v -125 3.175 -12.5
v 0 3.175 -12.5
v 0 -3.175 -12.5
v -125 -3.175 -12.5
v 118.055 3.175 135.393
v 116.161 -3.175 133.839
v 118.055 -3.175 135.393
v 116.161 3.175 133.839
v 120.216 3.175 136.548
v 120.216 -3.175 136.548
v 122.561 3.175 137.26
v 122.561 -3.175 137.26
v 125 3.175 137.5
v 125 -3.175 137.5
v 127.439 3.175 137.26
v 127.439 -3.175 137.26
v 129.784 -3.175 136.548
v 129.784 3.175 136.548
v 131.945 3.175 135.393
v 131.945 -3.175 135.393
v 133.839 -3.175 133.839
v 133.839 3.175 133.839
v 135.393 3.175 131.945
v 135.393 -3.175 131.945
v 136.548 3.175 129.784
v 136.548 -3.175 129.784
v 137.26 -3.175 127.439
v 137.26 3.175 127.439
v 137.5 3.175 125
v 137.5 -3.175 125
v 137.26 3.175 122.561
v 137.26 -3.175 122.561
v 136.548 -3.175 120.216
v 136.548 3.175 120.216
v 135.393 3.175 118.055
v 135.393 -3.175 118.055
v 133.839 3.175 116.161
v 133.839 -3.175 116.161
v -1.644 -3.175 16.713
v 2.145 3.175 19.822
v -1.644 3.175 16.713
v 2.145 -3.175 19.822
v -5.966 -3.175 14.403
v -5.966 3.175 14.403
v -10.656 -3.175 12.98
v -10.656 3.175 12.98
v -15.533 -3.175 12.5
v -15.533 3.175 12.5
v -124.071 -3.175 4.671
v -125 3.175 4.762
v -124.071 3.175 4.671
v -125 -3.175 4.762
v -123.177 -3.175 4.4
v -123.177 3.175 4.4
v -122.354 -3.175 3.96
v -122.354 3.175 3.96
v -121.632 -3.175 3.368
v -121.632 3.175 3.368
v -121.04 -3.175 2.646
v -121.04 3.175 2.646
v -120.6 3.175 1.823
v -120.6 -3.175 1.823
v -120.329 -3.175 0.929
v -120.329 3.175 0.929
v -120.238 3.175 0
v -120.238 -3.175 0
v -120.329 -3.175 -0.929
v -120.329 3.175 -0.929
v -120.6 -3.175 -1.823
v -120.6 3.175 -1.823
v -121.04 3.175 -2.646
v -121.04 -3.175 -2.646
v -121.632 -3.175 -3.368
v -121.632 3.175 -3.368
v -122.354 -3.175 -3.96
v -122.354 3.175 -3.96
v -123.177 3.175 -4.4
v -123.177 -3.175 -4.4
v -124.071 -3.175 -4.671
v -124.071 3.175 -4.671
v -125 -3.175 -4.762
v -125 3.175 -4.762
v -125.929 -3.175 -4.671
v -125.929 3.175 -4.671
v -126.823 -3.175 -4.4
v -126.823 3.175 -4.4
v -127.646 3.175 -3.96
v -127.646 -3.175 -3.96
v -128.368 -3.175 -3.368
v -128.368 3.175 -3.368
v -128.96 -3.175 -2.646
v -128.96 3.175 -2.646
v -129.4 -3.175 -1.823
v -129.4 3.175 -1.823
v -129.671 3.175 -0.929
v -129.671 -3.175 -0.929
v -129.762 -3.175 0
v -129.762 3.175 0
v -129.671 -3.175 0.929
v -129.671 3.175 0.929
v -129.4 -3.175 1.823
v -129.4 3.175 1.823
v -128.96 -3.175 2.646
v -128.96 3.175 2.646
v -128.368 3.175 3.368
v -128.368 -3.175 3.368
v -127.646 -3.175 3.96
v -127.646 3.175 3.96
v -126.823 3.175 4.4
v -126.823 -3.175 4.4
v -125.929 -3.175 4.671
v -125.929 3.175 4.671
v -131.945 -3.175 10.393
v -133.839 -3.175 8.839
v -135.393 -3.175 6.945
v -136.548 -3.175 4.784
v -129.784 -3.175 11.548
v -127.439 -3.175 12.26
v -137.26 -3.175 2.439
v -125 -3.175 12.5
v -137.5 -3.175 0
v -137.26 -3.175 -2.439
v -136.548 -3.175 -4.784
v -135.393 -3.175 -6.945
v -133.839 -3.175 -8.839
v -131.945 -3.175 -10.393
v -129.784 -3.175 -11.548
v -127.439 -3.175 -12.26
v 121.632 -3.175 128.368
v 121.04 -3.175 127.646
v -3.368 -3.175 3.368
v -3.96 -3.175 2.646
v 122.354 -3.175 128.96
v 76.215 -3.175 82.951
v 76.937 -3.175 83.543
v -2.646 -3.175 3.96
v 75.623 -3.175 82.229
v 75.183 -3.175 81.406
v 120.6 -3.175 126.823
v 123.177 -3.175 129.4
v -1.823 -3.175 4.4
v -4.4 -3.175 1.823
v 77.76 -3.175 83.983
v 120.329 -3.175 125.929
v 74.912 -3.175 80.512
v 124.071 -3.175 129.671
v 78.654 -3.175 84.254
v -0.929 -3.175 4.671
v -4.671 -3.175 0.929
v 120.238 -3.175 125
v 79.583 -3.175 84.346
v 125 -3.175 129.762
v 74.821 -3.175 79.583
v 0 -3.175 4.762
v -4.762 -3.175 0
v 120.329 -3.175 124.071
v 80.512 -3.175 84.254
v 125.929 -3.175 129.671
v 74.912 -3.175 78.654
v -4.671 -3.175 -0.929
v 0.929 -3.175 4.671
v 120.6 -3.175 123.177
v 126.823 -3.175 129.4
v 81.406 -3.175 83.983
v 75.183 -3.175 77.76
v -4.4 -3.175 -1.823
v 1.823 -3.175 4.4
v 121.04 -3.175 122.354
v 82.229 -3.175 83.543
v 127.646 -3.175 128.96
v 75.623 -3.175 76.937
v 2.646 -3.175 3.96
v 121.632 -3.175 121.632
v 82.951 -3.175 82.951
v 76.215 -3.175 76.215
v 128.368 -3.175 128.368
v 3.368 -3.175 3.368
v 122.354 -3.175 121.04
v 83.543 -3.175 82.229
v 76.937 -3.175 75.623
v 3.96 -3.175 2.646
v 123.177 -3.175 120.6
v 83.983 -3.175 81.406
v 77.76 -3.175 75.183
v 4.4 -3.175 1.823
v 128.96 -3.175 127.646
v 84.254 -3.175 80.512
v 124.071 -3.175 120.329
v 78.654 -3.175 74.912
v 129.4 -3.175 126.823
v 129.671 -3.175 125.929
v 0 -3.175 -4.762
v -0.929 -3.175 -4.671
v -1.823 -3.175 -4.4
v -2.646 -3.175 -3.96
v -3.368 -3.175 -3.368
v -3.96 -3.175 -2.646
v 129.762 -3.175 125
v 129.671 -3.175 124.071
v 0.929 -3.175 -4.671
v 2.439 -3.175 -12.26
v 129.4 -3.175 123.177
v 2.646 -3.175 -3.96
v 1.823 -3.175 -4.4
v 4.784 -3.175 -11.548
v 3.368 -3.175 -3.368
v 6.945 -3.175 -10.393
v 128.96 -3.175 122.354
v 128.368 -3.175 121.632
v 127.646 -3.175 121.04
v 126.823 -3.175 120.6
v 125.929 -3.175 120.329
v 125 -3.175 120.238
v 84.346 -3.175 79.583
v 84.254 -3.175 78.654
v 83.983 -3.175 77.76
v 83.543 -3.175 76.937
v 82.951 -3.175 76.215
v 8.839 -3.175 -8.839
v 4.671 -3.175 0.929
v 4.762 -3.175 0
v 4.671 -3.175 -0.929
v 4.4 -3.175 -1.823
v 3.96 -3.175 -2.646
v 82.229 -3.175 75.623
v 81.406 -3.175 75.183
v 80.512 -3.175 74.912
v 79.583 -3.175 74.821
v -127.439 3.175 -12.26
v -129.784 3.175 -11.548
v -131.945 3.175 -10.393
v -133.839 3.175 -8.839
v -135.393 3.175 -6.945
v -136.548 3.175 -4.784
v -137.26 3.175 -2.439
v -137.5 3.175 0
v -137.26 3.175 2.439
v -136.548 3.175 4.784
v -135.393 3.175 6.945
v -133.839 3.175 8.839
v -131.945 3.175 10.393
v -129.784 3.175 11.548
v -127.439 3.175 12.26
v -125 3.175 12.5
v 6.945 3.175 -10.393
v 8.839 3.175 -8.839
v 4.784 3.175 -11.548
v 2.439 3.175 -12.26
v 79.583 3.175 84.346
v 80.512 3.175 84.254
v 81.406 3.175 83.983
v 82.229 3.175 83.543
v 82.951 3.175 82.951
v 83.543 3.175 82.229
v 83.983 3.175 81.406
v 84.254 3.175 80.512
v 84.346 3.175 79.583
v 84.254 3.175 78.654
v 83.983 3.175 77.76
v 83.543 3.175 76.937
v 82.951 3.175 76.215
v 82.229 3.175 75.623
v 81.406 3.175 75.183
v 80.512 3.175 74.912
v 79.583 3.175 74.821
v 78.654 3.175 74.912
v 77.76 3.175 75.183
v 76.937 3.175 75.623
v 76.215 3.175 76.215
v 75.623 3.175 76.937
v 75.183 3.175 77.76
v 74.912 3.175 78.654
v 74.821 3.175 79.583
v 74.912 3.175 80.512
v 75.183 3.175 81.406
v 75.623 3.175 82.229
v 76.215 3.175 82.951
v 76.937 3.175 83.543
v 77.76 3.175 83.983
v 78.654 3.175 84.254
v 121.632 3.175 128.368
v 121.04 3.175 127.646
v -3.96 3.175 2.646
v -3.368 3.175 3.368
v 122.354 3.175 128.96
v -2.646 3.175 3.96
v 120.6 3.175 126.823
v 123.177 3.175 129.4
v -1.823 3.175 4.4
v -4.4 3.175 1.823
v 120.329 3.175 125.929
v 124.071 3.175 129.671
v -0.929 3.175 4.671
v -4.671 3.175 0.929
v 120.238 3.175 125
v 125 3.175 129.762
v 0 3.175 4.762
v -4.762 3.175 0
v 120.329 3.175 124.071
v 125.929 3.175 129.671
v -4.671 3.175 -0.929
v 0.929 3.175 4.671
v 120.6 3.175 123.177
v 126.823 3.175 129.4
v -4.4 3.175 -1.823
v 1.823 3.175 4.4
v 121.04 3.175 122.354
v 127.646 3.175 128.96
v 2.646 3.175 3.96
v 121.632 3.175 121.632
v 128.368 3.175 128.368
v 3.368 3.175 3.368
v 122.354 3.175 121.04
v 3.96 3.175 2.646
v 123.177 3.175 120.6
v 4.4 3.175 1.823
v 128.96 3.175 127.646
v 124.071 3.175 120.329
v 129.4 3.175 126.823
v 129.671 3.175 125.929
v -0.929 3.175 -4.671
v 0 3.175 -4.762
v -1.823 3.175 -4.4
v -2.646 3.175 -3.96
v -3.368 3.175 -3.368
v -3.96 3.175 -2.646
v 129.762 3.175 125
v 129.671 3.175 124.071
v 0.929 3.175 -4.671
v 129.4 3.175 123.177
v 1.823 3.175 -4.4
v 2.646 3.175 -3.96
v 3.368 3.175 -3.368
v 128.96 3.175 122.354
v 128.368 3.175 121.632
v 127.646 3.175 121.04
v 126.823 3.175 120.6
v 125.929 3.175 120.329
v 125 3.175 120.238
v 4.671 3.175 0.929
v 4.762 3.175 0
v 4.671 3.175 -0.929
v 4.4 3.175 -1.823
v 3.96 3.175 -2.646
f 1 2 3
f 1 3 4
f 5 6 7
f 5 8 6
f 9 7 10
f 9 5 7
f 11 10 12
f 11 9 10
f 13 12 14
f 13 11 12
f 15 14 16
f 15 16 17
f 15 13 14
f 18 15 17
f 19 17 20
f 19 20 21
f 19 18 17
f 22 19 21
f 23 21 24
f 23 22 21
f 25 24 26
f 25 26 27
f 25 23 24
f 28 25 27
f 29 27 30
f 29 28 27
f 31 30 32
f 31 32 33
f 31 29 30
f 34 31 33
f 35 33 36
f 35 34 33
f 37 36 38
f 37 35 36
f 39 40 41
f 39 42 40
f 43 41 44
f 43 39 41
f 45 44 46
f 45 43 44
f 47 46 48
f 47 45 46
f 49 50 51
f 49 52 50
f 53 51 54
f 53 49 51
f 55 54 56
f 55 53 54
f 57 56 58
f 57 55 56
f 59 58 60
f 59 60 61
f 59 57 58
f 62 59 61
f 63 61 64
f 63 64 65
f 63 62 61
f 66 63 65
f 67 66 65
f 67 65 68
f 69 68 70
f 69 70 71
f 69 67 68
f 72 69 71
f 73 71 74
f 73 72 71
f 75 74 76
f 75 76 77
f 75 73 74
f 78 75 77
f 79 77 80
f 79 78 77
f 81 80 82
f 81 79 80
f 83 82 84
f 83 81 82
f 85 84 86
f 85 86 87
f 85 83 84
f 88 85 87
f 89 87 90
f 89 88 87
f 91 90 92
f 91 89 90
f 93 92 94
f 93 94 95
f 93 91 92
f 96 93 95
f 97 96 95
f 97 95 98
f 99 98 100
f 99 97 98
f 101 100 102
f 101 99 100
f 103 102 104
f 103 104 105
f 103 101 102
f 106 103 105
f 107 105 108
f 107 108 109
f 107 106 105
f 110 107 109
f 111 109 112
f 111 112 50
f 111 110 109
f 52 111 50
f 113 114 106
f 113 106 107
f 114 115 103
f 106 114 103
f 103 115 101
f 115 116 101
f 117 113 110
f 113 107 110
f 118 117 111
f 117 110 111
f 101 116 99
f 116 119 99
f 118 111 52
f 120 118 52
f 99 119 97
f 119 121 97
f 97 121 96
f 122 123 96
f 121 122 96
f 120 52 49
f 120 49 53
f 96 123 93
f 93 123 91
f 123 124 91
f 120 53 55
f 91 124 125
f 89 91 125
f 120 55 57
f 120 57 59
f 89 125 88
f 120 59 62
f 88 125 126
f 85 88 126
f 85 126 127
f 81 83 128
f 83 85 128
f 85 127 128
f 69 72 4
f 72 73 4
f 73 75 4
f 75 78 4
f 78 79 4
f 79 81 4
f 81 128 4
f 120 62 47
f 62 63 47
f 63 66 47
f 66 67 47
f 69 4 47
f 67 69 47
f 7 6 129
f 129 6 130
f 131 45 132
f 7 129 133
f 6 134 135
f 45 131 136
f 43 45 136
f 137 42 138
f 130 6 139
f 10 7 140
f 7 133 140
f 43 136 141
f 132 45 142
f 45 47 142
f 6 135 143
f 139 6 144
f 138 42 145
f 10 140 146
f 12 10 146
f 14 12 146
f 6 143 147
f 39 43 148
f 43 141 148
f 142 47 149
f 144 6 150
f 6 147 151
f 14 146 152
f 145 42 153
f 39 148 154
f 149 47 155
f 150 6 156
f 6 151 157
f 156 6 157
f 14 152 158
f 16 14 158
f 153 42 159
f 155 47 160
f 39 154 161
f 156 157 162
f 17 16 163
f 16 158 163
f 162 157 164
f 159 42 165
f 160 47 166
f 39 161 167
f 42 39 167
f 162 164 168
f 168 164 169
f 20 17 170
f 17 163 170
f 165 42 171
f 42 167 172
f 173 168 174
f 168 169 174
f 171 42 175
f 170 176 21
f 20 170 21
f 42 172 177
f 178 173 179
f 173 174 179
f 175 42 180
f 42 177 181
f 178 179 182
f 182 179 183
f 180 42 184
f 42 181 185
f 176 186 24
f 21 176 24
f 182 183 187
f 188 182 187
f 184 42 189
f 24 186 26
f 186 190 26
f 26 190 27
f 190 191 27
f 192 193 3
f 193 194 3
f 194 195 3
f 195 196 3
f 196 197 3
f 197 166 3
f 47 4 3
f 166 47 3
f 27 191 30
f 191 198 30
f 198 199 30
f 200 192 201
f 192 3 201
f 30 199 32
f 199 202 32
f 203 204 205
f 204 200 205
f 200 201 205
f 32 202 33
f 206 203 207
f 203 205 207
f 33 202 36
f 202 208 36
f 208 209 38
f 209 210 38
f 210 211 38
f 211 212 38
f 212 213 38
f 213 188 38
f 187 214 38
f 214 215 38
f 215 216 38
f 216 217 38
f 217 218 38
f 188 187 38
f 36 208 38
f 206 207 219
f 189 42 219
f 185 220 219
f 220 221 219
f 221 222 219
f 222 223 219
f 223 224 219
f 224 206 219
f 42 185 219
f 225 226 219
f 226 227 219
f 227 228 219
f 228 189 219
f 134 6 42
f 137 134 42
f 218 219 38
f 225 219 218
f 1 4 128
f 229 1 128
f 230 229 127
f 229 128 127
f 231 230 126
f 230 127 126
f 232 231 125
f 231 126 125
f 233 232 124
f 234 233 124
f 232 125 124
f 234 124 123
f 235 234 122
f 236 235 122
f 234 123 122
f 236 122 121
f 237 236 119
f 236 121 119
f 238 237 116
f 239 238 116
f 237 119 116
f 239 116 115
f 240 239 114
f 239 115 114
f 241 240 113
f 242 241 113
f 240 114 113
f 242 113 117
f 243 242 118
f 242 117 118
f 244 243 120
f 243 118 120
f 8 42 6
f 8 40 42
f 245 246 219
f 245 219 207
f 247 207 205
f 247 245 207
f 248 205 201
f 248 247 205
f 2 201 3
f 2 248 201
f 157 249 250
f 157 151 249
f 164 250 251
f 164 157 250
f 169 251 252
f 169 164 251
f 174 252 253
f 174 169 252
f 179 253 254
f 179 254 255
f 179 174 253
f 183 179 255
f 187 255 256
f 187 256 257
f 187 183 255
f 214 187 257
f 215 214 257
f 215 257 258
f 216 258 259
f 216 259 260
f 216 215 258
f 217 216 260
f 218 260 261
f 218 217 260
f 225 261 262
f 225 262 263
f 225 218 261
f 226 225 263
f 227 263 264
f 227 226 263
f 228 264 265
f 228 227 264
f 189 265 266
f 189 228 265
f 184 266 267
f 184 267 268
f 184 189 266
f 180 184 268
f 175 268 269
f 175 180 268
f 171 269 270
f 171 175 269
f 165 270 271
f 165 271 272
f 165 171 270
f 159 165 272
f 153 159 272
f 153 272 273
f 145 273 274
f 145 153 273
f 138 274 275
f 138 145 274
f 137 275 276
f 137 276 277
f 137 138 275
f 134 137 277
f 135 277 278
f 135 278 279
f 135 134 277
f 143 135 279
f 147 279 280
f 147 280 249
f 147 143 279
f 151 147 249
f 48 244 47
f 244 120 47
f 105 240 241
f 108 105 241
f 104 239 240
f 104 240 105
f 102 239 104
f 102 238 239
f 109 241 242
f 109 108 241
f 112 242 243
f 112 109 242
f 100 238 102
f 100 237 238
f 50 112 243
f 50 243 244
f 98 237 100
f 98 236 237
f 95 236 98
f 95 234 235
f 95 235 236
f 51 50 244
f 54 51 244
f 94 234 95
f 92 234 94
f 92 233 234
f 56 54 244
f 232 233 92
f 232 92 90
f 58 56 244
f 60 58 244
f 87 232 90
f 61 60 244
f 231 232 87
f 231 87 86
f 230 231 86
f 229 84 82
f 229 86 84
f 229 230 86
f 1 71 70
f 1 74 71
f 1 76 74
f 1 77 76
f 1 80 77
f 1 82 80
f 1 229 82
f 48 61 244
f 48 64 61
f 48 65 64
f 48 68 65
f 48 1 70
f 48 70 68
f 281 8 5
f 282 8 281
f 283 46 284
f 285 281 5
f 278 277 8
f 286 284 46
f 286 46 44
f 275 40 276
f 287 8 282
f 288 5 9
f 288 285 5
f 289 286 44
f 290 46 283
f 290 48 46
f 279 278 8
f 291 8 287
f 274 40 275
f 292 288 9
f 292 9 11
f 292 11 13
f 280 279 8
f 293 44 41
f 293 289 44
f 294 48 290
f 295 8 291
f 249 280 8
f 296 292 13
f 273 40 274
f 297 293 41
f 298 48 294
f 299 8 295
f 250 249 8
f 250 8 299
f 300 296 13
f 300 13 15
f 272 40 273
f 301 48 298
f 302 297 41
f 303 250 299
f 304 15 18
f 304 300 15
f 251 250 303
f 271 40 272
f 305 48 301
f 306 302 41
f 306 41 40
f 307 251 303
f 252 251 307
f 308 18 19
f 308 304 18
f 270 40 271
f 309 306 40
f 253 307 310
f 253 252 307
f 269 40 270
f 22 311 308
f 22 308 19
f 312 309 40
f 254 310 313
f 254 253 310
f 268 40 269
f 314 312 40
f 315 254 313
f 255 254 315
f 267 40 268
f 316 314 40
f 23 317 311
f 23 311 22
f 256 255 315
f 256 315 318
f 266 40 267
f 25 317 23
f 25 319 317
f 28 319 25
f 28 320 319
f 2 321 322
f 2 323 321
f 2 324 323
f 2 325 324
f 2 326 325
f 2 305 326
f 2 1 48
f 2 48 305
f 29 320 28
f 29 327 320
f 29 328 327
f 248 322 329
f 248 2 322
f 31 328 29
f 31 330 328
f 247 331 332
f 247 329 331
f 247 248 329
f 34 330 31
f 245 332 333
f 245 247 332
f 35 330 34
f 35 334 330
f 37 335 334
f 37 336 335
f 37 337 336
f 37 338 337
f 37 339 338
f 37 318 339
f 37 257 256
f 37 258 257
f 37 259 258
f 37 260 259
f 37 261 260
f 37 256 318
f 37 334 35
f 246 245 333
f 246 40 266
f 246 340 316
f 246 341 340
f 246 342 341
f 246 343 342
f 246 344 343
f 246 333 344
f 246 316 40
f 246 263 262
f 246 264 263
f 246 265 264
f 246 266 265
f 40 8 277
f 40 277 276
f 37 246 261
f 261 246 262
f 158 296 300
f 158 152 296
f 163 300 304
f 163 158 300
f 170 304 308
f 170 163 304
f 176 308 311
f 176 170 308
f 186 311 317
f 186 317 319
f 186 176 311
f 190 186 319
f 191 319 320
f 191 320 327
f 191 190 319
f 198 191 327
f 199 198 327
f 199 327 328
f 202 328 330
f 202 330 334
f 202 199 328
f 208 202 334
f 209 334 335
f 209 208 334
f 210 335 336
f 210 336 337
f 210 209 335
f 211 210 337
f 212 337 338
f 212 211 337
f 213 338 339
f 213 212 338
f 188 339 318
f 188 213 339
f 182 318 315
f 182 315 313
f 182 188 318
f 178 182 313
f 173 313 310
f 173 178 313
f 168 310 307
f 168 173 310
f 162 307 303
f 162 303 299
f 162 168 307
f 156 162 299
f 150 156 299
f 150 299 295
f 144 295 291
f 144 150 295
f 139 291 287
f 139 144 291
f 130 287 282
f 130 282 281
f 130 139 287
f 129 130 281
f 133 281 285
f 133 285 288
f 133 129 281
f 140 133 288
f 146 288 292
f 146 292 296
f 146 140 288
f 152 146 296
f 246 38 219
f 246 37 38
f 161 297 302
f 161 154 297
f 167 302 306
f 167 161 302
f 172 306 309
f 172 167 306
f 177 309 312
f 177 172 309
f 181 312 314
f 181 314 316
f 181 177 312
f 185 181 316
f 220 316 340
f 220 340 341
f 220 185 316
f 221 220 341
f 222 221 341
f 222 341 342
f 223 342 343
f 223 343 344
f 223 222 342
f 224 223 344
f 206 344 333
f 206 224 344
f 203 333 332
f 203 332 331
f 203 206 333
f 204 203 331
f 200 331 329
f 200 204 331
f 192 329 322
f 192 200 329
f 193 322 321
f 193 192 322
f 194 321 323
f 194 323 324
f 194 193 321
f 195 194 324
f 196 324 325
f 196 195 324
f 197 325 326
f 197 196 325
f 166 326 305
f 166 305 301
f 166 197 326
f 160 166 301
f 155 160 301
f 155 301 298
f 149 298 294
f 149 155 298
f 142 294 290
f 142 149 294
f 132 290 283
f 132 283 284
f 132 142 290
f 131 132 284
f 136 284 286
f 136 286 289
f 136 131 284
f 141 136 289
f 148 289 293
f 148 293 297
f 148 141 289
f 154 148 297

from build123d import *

# Parameters (mm, degrees)
SKETCH1_R           = 4.7625
BOSS_EXTRUDE1_DEPTH = 3.175
FILLET1_R           = 25


with BuildPart() as part:
    # Sketch1 → Boss-Extrude1 (new, symmetric)
    # profile 1 of 3: a face of its own
    with BuildSketch(Plane(origin=(0, 0, 0), x_dir=(1, 0, 0), z_dir=(0, 1, 0))):
        with BuildLine():
            Line((-125, -12.5), (-5.17766953, -12.5))
            Line((-5.17766953, -12.5), (-8.838834765, -8.838834765))
            ThreePointArc((-8.838834765, -8.838834765), (-11.548494156, 4.783542905), (0, 12.5))
            Line((0, 12.5), (-125, 12.5))
            ThreePointArc((-125, 12.5), (-137.5, 0), (-125, -12.5))
        make_face()
        with Locations(Location((-125, 0, 0), (0, 0, 270))):
            Circle(SKETCH1_R, mode=Mode.SUBTRACT)
    # profile 2 of 3: a face of its own
    with BuildSketch(Plane(origin=(0, 0, 0), x_dir=(1, 0, 0), z_dir=(0, 1, 0))):
        with BuildLine():
            Line((-5.17766953, -12.5), (0, -12.5))
            ThreePointArc((0, -12.5), (11.548494156, -4.783542905), (8.838834765, 8.838834765))
            ThreePointArc((8.838834765, 8.838834765), (4.783542905, 11.548494156), (0, 12.5))
            ThreePointArc((0, 12.5), (-11.548494156, 4.783542905), (-8.838834765, -8.838834765))
            Line((-8.838834765, -8.838834765), (-5.17766953, -12.5))
        make_face()
        with Locations(Location((0, 0, 0), (0, 0, 270))):
            Circle(SKETCH1_R, mode=Mode.SUBTRACT)
    # profile 3 of 3: a face of its own
    with BuildSketch(Plane(origin=(0, 0, 0), x_dir=(1, 0, 0), z_dir=(0, 1, 0))):
        with BuildLine():
            ThreePointArc((8.838834765, 8.838834765), (11.548494156, -4.783542905), (0, -12.5))
            Line((0, -12.5), (-5.17766953, -12.5))
            Line((-5.17766953, -12.5), (116.161165235, -133.838834765))
            ThreePointArc((116.161165235, -133.838834765), (133.838834765, -133.838834765), (133.838834765, -116.161165235))
            Line((133.838834765, -116.161165235), (8.838834765, 8.838834765))
        make_face()
        with Locations(Location((125, -125, 0), (0, 0, 270))):
            Circle(SKETCH1_R, mode=Mode.SUBTRACT)
        with Locations(Location((79.583029745, -79.583029745, 0), (0, 0, 270))):
            Circle(SKETCH1_R, mode=Mode.SUBTRACT)
    extrude(amount=BOSS_EXTRUDE1_DEPTH, both=True)

    # Fillet1
    fillet1_edges = [part.edges().sort_by_distance(p)[0] for p in [
        (-5.17766953, 0, 12.5),
    ]]
    fillet(fillet1_edges, radius=FILLET1_R)


solid = part.part
